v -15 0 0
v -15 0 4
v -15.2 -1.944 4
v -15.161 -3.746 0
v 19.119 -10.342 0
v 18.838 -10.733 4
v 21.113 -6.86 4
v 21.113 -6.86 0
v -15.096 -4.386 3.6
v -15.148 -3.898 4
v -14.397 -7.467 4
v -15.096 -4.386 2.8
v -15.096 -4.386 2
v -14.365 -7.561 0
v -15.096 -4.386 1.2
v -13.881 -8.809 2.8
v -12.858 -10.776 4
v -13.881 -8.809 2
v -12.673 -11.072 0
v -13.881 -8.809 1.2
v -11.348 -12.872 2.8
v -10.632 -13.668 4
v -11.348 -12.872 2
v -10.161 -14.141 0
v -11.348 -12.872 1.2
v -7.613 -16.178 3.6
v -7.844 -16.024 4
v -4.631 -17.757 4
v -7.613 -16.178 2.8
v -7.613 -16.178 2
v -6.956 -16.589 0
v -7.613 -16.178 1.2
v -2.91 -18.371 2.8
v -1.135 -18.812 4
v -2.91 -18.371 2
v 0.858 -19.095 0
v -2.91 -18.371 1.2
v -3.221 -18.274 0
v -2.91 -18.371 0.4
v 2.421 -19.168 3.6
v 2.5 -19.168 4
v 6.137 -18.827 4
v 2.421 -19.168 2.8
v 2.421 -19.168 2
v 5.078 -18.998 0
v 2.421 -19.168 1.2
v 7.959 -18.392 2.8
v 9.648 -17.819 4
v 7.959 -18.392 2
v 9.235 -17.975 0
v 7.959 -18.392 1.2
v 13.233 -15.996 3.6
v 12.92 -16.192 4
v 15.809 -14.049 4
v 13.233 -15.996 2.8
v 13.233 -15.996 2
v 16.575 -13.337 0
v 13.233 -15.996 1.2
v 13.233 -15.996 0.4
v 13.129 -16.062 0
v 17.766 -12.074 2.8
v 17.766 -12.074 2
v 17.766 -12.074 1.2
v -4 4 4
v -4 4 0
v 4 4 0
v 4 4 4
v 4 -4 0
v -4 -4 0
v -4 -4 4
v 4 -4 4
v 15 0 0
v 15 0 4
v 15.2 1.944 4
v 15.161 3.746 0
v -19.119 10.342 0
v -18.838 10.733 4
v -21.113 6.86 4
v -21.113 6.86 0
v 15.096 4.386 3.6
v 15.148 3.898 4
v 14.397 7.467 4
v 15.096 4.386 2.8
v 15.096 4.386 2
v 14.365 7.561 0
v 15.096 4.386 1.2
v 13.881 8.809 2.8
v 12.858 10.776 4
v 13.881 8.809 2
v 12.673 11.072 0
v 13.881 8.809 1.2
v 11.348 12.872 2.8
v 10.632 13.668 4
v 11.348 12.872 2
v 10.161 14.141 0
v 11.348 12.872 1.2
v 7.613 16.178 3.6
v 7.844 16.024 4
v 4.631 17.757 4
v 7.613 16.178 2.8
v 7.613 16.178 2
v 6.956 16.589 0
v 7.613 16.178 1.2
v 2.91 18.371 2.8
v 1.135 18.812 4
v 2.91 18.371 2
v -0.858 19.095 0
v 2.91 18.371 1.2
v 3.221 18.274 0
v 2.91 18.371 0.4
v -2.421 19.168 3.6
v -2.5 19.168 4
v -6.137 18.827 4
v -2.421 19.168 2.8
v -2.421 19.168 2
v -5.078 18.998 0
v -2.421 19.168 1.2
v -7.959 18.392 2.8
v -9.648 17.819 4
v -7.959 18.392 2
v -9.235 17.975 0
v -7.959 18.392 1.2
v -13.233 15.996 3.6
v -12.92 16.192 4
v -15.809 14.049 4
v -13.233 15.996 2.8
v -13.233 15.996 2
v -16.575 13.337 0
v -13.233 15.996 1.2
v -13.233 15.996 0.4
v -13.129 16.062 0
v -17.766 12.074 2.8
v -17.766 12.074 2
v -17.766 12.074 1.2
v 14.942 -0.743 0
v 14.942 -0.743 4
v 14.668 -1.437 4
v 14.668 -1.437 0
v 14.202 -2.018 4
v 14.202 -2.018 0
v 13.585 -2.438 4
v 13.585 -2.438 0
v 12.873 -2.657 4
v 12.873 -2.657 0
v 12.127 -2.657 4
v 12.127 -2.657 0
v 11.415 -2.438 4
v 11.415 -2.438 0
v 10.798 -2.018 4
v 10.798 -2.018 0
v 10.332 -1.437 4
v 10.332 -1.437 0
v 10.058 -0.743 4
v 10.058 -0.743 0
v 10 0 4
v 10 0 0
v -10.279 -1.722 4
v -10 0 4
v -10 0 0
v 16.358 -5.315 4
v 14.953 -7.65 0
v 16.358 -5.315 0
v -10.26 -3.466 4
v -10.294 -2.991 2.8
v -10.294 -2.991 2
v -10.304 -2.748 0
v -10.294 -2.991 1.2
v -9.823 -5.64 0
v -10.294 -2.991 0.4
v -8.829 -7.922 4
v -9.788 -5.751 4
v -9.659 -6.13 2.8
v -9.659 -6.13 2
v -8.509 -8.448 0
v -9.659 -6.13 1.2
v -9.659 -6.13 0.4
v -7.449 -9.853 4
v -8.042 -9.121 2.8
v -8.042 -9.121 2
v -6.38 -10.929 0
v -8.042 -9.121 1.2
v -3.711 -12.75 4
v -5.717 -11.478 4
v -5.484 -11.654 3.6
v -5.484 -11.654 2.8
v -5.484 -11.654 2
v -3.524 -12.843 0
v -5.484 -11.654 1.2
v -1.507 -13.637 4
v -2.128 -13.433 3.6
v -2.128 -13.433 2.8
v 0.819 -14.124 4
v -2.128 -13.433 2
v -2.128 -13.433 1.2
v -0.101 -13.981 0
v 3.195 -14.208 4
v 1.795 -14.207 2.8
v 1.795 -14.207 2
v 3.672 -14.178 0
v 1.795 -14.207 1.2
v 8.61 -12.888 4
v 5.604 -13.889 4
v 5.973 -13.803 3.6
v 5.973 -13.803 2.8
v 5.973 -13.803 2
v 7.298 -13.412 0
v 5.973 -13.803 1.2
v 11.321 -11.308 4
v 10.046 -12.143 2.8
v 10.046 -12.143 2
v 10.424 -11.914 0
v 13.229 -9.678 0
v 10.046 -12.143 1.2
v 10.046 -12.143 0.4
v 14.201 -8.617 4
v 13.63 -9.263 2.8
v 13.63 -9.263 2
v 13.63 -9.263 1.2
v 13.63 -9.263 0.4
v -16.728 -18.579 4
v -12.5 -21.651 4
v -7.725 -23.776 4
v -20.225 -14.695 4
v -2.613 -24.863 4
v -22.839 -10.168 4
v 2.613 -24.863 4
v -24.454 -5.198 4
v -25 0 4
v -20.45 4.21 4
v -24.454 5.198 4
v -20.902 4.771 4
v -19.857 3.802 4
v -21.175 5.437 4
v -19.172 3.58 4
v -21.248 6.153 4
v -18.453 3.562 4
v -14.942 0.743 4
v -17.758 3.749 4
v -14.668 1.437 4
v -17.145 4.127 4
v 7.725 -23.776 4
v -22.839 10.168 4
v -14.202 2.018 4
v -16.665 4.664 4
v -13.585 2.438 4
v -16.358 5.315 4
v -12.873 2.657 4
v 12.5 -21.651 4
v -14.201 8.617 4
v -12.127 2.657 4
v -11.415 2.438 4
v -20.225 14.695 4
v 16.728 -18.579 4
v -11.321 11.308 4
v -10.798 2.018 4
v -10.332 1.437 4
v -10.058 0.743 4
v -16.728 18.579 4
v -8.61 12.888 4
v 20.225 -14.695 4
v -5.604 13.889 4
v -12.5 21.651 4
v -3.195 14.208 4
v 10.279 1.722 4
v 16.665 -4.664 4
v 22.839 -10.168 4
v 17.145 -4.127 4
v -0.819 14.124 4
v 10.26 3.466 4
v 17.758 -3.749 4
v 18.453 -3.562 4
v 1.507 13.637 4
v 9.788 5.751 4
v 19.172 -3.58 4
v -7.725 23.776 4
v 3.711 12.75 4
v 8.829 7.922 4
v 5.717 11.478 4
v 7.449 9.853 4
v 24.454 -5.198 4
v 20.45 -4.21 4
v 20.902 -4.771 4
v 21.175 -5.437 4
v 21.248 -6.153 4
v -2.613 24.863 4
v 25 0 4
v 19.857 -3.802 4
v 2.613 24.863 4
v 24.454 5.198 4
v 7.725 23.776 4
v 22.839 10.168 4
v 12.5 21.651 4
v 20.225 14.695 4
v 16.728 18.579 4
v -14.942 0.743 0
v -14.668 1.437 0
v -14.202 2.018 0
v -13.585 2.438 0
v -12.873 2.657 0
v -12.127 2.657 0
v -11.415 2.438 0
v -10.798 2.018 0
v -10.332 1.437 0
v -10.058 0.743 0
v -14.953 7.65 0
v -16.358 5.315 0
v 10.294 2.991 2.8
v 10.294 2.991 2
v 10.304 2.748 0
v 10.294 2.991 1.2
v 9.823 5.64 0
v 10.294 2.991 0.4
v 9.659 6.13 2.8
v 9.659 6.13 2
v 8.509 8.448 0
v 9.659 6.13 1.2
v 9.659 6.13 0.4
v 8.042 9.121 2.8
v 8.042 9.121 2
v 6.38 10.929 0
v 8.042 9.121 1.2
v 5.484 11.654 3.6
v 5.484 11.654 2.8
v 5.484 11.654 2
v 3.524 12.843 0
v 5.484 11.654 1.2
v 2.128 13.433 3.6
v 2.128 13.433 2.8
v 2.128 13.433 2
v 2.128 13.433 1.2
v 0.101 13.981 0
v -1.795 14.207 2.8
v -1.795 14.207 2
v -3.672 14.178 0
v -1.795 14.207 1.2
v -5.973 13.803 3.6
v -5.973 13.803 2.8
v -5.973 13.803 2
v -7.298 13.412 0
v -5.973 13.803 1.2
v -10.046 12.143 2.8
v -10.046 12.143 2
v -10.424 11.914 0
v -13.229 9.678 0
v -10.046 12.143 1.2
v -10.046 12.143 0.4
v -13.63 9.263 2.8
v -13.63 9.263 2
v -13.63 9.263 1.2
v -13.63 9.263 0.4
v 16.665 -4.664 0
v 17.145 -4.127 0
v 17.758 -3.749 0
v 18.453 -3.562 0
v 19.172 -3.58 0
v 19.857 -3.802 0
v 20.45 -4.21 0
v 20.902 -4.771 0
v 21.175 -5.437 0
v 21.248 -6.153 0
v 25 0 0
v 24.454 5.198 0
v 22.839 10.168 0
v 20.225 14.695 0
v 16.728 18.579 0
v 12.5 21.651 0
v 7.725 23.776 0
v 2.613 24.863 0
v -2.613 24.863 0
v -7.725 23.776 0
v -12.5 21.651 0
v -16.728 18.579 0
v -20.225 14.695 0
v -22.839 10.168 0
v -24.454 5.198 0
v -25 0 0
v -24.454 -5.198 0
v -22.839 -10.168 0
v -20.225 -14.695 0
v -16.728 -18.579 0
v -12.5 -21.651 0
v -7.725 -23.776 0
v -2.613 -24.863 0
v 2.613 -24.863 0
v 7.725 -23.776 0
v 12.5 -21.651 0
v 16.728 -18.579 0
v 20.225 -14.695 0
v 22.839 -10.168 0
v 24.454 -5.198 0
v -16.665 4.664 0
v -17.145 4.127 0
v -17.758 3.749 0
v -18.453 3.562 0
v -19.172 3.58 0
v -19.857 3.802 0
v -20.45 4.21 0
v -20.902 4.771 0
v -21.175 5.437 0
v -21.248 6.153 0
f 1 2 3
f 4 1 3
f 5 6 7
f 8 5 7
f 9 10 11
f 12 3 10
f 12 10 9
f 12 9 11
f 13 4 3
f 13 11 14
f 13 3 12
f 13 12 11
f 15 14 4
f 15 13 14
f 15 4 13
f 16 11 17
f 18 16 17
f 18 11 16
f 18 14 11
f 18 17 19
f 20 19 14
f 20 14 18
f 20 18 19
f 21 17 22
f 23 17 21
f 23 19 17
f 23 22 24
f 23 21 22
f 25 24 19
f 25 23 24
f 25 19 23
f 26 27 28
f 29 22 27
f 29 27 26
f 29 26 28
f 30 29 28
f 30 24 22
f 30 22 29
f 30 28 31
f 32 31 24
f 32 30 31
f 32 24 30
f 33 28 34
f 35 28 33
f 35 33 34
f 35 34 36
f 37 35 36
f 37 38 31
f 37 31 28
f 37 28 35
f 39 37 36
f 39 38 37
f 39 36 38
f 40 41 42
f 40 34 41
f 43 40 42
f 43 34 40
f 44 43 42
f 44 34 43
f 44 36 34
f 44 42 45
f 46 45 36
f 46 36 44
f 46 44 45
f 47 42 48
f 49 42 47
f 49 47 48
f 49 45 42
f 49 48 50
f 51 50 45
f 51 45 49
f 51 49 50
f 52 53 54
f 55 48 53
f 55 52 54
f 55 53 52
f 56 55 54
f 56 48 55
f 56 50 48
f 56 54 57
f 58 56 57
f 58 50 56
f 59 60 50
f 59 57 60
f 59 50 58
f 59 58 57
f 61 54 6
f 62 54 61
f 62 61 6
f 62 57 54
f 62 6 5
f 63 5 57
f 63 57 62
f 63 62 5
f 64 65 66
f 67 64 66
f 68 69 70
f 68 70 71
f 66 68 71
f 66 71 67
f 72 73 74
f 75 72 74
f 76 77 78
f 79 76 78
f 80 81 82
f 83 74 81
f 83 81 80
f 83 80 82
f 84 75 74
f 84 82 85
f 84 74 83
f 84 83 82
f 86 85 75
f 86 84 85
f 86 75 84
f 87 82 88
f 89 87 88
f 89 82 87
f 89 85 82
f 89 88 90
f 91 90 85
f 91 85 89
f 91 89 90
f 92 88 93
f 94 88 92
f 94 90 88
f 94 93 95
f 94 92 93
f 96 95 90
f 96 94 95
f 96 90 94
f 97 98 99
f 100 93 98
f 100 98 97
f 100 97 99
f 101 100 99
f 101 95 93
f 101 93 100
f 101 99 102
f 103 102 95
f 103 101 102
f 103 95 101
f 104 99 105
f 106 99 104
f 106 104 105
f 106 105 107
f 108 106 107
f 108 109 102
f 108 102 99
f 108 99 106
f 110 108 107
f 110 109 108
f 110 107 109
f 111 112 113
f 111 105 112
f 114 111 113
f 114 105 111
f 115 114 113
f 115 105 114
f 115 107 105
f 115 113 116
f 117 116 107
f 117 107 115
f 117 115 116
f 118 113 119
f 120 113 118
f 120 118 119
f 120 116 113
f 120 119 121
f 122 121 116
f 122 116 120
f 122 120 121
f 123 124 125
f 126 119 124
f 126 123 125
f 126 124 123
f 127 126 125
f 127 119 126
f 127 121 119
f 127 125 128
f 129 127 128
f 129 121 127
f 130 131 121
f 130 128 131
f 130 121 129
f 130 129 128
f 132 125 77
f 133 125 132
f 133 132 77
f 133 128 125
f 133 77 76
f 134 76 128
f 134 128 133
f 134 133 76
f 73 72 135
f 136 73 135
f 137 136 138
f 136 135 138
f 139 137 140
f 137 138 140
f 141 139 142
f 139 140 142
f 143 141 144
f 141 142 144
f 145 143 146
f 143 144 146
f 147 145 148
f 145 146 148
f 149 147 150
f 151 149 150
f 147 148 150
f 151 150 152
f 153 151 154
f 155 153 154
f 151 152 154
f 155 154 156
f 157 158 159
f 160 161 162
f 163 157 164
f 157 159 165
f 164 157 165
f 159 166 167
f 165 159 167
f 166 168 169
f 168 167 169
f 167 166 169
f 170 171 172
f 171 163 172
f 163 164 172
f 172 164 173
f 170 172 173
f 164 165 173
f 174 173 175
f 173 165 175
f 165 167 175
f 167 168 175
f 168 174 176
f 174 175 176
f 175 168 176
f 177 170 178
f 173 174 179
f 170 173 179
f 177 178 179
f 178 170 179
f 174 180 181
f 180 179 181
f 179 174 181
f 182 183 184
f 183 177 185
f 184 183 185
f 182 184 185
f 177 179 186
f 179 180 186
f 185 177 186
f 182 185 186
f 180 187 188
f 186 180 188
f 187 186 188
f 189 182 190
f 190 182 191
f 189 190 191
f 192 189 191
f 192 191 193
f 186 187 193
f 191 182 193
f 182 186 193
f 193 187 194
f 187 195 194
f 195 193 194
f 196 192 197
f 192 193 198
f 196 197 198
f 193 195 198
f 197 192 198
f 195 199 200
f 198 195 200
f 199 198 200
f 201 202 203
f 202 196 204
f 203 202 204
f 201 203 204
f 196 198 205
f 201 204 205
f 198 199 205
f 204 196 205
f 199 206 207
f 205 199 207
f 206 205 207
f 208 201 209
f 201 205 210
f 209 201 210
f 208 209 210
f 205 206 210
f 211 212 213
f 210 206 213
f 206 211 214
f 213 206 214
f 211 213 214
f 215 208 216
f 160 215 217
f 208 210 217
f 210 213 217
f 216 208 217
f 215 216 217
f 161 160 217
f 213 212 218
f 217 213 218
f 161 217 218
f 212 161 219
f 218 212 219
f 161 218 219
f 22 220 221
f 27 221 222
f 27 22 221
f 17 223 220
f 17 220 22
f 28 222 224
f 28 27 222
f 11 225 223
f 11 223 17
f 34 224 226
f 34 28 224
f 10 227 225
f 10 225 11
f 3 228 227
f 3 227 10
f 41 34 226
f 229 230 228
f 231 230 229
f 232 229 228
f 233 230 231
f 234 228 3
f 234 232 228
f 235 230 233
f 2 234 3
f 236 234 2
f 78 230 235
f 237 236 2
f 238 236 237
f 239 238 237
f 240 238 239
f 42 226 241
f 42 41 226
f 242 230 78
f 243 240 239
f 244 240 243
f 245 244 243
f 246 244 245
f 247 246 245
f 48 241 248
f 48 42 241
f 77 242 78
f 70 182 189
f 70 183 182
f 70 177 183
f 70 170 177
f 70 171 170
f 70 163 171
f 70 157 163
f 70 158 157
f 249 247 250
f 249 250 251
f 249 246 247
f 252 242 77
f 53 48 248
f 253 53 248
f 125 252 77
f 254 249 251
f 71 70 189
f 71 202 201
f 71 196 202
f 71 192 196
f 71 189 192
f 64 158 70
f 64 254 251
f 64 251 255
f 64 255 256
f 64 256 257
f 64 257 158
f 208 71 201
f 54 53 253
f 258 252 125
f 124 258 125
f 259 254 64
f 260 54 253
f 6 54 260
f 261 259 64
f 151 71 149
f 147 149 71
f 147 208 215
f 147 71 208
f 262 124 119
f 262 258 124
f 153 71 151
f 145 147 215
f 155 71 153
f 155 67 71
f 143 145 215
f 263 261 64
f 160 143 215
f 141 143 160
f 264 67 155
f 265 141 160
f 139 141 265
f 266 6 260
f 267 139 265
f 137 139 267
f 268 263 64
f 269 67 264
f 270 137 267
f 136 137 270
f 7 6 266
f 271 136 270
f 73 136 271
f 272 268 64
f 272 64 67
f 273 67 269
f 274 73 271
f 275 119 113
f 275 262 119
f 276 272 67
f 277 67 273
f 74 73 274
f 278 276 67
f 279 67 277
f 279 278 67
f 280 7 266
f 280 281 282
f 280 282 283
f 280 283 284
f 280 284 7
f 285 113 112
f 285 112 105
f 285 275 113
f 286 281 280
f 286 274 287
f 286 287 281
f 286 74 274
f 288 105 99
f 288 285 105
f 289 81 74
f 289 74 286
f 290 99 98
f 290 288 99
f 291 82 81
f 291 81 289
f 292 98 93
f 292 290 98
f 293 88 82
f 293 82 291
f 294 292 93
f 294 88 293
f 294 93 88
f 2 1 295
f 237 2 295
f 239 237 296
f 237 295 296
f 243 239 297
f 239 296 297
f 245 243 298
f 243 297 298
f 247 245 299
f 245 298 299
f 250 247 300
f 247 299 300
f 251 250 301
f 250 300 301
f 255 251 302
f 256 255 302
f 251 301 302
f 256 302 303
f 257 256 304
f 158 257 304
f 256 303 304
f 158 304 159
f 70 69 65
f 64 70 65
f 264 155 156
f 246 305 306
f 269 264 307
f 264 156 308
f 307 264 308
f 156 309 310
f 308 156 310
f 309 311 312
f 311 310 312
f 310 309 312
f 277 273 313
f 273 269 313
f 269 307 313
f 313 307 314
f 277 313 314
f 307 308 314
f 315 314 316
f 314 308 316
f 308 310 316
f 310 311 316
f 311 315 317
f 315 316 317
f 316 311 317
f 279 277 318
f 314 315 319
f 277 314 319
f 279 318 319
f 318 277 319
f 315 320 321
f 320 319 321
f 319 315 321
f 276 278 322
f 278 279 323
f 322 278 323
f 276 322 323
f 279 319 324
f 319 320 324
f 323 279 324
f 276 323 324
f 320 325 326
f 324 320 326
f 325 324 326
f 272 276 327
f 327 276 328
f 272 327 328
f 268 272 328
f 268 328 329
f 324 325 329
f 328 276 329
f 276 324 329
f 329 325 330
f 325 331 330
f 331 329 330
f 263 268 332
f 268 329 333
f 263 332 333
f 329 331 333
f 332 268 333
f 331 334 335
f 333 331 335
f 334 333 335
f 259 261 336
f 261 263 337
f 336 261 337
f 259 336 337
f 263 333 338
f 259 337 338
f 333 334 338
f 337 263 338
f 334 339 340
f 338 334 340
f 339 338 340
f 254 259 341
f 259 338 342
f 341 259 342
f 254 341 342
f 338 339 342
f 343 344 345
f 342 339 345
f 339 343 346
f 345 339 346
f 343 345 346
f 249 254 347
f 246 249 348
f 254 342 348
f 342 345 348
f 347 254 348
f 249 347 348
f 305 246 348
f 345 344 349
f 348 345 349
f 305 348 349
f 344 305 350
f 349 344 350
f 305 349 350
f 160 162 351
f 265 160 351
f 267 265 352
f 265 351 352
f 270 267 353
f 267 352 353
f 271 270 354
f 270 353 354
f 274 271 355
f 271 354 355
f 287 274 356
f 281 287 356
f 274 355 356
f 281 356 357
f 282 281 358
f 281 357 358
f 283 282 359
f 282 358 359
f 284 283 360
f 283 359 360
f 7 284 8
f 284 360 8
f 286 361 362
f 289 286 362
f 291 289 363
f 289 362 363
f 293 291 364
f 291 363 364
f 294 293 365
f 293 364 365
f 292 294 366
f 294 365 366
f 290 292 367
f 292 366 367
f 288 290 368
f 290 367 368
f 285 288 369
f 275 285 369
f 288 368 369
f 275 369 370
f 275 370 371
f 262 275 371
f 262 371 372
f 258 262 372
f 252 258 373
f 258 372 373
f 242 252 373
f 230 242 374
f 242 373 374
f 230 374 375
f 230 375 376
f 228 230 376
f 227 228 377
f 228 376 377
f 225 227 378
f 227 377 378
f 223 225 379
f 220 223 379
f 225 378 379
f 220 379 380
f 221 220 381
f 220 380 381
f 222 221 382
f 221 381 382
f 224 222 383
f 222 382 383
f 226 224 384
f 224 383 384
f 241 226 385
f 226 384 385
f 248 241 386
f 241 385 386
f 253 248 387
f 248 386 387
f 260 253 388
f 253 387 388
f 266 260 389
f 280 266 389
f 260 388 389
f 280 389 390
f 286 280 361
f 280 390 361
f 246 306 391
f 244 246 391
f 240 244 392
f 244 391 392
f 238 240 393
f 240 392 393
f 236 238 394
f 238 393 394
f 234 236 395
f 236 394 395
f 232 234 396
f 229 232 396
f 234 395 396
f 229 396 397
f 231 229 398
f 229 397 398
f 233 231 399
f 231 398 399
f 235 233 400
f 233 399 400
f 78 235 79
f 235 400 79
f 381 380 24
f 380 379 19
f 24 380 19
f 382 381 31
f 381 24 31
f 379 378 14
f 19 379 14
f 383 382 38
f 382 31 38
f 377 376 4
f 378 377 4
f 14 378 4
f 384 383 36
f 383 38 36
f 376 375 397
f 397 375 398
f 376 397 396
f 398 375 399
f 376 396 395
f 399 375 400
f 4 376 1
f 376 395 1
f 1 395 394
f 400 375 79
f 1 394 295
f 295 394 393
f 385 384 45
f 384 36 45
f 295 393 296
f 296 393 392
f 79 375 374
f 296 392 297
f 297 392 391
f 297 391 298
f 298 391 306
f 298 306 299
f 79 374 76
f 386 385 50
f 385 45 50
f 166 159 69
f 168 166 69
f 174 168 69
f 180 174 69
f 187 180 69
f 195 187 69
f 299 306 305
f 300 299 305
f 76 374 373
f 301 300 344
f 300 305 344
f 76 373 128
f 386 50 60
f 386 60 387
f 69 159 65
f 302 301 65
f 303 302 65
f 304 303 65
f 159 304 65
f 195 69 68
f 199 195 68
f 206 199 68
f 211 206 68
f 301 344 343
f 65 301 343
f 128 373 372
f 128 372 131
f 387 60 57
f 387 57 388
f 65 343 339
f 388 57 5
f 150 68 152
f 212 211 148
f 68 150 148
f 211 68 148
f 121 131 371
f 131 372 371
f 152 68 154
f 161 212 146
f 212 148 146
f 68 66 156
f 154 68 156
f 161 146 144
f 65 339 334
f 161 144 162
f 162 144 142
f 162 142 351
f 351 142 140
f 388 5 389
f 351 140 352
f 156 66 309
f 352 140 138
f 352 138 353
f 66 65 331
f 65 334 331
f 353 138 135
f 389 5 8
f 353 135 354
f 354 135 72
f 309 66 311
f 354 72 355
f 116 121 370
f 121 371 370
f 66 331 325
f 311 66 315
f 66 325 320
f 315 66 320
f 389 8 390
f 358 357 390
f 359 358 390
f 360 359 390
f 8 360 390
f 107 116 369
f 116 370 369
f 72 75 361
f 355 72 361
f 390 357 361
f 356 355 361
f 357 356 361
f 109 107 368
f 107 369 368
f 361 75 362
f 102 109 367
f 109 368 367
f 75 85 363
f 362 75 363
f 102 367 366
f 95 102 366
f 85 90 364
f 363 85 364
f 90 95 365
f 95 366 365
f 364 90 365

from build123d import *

# Parameters (mm, degrees)
SKETCH_R        = 25
PAD_DEPTH       = 4
POCKET_DEPTH    = 5
SKETCH009_W     = 8
SKETCH009_H     = 8
POCKET001_DEPTH = 5


with BuildPart() as part:
    # Sketch → Pad (new body)
    with BuildSketch(Plane.XY):
        Circle(SKETCH_R)
    extrude(amount=PAD_DEPTH)

    # Sketch008 → Pocket (cut)
    with BuildSketch(Plane(origin=(0, 0, 0), x_dir=(-1, 0, 0), z_dir=(0, 0, 1))):
        with BuildLine():
            add(Edge.make_bspline(
                [(10, 0), (10.72, 2.827433), (10.551736, 6.107253), (9.255372, 9.525547), (6.717902, 12.639095), (3.029145, 14.935747), (-1.475809, 15.944125), (-6.25069, 15.376552), (-10.669796, 13.21807), (-14.170604, 9.717764), (-16.358172, 5.315092)],
                knots=[0, 0, 0, 0, 0, 0, 0, 0, 0, 0, 0, 2.999063, 2.999063, 2.999063, 2.999063, 2.999063, 2.999063, 2.999063, 2.999063, 2.999063, 2.999063, 2.999063], degree=10))
            ThreePointArc((-16.358172, 5.315092), (-19.522596, 3.666166), (-21.113455, 6.860177))
            add(Edge.make_bspline(
                [(15, 0), (15.72, 4.24115), (15.107604, 8.934687), (12.922973, 13.609729), (9.116521, 17.666081), (3.904817, 20.464523), (-2.203607, 21.466288), (-8.476704, 20.39419), (-14.128959, 17.31496), (-18.489025, 12.607374), (-21.113455, 6.860177)],
                knots=[0, 0, 0, 0, 0, 0, 0, 0, 0, 0, 0, 2.999063, 2.999063, 2.999063, 2.999063, 2.999063, 2.999063, 2.999063, 2.999063, 2.999063, 2.999063, 2.999063], degree=10))
            ThreePointArc((15, 0), (12.5, -2.684775), (10, 0))
        make_face()
    extrude(amount=POCKET_DEPTH, mode=Mode.SUBTRACT)

    # Sketch009 → Pocket001 (cut)
    with BuildSketch(Plane.XY):
        with BuildLine():
            add(Edge.make_bspline(
                [(10, 0), (10.72, 2.827433), (10.551736, 6.107253), (9.255372, 9.525547), (6.717902, 12.639095), (3.029145, 14.935747), (-1.475809, 15.944125), (-6.25069, 15.376552), (-10.669796, 13.21807), (-14.170604, 9.717764), (-16.358172, 5.315092)],
                knots=[0, 0, 0, 0, 0, 0, 0, 0, 0, 0, 0, 2.999063, 2.999063, 2.999063, 2.999063, 2.999063, 2.999063, 2.999063, 2.999063, 2.999063, 2.999063, 2.999063], degree=10))
            ThreePointArc((-16.358172, 5.315092), (-19.522596, 3.666166), (-21.113455, 6.860177))
            add(Edge.make_bspline(
                [(15, 0), (15.72, 4.24115), (15.107604, 8.934687), (12.922973, 13.609729), (9.116521, 17.666081), (3.904817, 20.464523), (-2.203607, 21.466288), (-8.476704, 20.39419), (-14.128959, 17.31496), (-18.489025, 12.607374), (-21.113455, 6.860177)],
                knots=[0, 0, 0, 0, 0, 0, 0, 0, 0, 0, 0, 2.999063, 2.999063, 2.999063, 2.999063, 2.999063, 2.999063, 2.999063, 2.999063, 2.999063, 2.999063, 2.999063], degree=10))
            ThreePointArc((15, 0), (12.5, -2.684775), (10, 0))
        make_face()
        Rectangle(SKETCH009_W, SKETCH009_H)
    extrude(amount=POCKET001_DEPTH, mode=Mode.SUBTRACT)


solid = part.part
